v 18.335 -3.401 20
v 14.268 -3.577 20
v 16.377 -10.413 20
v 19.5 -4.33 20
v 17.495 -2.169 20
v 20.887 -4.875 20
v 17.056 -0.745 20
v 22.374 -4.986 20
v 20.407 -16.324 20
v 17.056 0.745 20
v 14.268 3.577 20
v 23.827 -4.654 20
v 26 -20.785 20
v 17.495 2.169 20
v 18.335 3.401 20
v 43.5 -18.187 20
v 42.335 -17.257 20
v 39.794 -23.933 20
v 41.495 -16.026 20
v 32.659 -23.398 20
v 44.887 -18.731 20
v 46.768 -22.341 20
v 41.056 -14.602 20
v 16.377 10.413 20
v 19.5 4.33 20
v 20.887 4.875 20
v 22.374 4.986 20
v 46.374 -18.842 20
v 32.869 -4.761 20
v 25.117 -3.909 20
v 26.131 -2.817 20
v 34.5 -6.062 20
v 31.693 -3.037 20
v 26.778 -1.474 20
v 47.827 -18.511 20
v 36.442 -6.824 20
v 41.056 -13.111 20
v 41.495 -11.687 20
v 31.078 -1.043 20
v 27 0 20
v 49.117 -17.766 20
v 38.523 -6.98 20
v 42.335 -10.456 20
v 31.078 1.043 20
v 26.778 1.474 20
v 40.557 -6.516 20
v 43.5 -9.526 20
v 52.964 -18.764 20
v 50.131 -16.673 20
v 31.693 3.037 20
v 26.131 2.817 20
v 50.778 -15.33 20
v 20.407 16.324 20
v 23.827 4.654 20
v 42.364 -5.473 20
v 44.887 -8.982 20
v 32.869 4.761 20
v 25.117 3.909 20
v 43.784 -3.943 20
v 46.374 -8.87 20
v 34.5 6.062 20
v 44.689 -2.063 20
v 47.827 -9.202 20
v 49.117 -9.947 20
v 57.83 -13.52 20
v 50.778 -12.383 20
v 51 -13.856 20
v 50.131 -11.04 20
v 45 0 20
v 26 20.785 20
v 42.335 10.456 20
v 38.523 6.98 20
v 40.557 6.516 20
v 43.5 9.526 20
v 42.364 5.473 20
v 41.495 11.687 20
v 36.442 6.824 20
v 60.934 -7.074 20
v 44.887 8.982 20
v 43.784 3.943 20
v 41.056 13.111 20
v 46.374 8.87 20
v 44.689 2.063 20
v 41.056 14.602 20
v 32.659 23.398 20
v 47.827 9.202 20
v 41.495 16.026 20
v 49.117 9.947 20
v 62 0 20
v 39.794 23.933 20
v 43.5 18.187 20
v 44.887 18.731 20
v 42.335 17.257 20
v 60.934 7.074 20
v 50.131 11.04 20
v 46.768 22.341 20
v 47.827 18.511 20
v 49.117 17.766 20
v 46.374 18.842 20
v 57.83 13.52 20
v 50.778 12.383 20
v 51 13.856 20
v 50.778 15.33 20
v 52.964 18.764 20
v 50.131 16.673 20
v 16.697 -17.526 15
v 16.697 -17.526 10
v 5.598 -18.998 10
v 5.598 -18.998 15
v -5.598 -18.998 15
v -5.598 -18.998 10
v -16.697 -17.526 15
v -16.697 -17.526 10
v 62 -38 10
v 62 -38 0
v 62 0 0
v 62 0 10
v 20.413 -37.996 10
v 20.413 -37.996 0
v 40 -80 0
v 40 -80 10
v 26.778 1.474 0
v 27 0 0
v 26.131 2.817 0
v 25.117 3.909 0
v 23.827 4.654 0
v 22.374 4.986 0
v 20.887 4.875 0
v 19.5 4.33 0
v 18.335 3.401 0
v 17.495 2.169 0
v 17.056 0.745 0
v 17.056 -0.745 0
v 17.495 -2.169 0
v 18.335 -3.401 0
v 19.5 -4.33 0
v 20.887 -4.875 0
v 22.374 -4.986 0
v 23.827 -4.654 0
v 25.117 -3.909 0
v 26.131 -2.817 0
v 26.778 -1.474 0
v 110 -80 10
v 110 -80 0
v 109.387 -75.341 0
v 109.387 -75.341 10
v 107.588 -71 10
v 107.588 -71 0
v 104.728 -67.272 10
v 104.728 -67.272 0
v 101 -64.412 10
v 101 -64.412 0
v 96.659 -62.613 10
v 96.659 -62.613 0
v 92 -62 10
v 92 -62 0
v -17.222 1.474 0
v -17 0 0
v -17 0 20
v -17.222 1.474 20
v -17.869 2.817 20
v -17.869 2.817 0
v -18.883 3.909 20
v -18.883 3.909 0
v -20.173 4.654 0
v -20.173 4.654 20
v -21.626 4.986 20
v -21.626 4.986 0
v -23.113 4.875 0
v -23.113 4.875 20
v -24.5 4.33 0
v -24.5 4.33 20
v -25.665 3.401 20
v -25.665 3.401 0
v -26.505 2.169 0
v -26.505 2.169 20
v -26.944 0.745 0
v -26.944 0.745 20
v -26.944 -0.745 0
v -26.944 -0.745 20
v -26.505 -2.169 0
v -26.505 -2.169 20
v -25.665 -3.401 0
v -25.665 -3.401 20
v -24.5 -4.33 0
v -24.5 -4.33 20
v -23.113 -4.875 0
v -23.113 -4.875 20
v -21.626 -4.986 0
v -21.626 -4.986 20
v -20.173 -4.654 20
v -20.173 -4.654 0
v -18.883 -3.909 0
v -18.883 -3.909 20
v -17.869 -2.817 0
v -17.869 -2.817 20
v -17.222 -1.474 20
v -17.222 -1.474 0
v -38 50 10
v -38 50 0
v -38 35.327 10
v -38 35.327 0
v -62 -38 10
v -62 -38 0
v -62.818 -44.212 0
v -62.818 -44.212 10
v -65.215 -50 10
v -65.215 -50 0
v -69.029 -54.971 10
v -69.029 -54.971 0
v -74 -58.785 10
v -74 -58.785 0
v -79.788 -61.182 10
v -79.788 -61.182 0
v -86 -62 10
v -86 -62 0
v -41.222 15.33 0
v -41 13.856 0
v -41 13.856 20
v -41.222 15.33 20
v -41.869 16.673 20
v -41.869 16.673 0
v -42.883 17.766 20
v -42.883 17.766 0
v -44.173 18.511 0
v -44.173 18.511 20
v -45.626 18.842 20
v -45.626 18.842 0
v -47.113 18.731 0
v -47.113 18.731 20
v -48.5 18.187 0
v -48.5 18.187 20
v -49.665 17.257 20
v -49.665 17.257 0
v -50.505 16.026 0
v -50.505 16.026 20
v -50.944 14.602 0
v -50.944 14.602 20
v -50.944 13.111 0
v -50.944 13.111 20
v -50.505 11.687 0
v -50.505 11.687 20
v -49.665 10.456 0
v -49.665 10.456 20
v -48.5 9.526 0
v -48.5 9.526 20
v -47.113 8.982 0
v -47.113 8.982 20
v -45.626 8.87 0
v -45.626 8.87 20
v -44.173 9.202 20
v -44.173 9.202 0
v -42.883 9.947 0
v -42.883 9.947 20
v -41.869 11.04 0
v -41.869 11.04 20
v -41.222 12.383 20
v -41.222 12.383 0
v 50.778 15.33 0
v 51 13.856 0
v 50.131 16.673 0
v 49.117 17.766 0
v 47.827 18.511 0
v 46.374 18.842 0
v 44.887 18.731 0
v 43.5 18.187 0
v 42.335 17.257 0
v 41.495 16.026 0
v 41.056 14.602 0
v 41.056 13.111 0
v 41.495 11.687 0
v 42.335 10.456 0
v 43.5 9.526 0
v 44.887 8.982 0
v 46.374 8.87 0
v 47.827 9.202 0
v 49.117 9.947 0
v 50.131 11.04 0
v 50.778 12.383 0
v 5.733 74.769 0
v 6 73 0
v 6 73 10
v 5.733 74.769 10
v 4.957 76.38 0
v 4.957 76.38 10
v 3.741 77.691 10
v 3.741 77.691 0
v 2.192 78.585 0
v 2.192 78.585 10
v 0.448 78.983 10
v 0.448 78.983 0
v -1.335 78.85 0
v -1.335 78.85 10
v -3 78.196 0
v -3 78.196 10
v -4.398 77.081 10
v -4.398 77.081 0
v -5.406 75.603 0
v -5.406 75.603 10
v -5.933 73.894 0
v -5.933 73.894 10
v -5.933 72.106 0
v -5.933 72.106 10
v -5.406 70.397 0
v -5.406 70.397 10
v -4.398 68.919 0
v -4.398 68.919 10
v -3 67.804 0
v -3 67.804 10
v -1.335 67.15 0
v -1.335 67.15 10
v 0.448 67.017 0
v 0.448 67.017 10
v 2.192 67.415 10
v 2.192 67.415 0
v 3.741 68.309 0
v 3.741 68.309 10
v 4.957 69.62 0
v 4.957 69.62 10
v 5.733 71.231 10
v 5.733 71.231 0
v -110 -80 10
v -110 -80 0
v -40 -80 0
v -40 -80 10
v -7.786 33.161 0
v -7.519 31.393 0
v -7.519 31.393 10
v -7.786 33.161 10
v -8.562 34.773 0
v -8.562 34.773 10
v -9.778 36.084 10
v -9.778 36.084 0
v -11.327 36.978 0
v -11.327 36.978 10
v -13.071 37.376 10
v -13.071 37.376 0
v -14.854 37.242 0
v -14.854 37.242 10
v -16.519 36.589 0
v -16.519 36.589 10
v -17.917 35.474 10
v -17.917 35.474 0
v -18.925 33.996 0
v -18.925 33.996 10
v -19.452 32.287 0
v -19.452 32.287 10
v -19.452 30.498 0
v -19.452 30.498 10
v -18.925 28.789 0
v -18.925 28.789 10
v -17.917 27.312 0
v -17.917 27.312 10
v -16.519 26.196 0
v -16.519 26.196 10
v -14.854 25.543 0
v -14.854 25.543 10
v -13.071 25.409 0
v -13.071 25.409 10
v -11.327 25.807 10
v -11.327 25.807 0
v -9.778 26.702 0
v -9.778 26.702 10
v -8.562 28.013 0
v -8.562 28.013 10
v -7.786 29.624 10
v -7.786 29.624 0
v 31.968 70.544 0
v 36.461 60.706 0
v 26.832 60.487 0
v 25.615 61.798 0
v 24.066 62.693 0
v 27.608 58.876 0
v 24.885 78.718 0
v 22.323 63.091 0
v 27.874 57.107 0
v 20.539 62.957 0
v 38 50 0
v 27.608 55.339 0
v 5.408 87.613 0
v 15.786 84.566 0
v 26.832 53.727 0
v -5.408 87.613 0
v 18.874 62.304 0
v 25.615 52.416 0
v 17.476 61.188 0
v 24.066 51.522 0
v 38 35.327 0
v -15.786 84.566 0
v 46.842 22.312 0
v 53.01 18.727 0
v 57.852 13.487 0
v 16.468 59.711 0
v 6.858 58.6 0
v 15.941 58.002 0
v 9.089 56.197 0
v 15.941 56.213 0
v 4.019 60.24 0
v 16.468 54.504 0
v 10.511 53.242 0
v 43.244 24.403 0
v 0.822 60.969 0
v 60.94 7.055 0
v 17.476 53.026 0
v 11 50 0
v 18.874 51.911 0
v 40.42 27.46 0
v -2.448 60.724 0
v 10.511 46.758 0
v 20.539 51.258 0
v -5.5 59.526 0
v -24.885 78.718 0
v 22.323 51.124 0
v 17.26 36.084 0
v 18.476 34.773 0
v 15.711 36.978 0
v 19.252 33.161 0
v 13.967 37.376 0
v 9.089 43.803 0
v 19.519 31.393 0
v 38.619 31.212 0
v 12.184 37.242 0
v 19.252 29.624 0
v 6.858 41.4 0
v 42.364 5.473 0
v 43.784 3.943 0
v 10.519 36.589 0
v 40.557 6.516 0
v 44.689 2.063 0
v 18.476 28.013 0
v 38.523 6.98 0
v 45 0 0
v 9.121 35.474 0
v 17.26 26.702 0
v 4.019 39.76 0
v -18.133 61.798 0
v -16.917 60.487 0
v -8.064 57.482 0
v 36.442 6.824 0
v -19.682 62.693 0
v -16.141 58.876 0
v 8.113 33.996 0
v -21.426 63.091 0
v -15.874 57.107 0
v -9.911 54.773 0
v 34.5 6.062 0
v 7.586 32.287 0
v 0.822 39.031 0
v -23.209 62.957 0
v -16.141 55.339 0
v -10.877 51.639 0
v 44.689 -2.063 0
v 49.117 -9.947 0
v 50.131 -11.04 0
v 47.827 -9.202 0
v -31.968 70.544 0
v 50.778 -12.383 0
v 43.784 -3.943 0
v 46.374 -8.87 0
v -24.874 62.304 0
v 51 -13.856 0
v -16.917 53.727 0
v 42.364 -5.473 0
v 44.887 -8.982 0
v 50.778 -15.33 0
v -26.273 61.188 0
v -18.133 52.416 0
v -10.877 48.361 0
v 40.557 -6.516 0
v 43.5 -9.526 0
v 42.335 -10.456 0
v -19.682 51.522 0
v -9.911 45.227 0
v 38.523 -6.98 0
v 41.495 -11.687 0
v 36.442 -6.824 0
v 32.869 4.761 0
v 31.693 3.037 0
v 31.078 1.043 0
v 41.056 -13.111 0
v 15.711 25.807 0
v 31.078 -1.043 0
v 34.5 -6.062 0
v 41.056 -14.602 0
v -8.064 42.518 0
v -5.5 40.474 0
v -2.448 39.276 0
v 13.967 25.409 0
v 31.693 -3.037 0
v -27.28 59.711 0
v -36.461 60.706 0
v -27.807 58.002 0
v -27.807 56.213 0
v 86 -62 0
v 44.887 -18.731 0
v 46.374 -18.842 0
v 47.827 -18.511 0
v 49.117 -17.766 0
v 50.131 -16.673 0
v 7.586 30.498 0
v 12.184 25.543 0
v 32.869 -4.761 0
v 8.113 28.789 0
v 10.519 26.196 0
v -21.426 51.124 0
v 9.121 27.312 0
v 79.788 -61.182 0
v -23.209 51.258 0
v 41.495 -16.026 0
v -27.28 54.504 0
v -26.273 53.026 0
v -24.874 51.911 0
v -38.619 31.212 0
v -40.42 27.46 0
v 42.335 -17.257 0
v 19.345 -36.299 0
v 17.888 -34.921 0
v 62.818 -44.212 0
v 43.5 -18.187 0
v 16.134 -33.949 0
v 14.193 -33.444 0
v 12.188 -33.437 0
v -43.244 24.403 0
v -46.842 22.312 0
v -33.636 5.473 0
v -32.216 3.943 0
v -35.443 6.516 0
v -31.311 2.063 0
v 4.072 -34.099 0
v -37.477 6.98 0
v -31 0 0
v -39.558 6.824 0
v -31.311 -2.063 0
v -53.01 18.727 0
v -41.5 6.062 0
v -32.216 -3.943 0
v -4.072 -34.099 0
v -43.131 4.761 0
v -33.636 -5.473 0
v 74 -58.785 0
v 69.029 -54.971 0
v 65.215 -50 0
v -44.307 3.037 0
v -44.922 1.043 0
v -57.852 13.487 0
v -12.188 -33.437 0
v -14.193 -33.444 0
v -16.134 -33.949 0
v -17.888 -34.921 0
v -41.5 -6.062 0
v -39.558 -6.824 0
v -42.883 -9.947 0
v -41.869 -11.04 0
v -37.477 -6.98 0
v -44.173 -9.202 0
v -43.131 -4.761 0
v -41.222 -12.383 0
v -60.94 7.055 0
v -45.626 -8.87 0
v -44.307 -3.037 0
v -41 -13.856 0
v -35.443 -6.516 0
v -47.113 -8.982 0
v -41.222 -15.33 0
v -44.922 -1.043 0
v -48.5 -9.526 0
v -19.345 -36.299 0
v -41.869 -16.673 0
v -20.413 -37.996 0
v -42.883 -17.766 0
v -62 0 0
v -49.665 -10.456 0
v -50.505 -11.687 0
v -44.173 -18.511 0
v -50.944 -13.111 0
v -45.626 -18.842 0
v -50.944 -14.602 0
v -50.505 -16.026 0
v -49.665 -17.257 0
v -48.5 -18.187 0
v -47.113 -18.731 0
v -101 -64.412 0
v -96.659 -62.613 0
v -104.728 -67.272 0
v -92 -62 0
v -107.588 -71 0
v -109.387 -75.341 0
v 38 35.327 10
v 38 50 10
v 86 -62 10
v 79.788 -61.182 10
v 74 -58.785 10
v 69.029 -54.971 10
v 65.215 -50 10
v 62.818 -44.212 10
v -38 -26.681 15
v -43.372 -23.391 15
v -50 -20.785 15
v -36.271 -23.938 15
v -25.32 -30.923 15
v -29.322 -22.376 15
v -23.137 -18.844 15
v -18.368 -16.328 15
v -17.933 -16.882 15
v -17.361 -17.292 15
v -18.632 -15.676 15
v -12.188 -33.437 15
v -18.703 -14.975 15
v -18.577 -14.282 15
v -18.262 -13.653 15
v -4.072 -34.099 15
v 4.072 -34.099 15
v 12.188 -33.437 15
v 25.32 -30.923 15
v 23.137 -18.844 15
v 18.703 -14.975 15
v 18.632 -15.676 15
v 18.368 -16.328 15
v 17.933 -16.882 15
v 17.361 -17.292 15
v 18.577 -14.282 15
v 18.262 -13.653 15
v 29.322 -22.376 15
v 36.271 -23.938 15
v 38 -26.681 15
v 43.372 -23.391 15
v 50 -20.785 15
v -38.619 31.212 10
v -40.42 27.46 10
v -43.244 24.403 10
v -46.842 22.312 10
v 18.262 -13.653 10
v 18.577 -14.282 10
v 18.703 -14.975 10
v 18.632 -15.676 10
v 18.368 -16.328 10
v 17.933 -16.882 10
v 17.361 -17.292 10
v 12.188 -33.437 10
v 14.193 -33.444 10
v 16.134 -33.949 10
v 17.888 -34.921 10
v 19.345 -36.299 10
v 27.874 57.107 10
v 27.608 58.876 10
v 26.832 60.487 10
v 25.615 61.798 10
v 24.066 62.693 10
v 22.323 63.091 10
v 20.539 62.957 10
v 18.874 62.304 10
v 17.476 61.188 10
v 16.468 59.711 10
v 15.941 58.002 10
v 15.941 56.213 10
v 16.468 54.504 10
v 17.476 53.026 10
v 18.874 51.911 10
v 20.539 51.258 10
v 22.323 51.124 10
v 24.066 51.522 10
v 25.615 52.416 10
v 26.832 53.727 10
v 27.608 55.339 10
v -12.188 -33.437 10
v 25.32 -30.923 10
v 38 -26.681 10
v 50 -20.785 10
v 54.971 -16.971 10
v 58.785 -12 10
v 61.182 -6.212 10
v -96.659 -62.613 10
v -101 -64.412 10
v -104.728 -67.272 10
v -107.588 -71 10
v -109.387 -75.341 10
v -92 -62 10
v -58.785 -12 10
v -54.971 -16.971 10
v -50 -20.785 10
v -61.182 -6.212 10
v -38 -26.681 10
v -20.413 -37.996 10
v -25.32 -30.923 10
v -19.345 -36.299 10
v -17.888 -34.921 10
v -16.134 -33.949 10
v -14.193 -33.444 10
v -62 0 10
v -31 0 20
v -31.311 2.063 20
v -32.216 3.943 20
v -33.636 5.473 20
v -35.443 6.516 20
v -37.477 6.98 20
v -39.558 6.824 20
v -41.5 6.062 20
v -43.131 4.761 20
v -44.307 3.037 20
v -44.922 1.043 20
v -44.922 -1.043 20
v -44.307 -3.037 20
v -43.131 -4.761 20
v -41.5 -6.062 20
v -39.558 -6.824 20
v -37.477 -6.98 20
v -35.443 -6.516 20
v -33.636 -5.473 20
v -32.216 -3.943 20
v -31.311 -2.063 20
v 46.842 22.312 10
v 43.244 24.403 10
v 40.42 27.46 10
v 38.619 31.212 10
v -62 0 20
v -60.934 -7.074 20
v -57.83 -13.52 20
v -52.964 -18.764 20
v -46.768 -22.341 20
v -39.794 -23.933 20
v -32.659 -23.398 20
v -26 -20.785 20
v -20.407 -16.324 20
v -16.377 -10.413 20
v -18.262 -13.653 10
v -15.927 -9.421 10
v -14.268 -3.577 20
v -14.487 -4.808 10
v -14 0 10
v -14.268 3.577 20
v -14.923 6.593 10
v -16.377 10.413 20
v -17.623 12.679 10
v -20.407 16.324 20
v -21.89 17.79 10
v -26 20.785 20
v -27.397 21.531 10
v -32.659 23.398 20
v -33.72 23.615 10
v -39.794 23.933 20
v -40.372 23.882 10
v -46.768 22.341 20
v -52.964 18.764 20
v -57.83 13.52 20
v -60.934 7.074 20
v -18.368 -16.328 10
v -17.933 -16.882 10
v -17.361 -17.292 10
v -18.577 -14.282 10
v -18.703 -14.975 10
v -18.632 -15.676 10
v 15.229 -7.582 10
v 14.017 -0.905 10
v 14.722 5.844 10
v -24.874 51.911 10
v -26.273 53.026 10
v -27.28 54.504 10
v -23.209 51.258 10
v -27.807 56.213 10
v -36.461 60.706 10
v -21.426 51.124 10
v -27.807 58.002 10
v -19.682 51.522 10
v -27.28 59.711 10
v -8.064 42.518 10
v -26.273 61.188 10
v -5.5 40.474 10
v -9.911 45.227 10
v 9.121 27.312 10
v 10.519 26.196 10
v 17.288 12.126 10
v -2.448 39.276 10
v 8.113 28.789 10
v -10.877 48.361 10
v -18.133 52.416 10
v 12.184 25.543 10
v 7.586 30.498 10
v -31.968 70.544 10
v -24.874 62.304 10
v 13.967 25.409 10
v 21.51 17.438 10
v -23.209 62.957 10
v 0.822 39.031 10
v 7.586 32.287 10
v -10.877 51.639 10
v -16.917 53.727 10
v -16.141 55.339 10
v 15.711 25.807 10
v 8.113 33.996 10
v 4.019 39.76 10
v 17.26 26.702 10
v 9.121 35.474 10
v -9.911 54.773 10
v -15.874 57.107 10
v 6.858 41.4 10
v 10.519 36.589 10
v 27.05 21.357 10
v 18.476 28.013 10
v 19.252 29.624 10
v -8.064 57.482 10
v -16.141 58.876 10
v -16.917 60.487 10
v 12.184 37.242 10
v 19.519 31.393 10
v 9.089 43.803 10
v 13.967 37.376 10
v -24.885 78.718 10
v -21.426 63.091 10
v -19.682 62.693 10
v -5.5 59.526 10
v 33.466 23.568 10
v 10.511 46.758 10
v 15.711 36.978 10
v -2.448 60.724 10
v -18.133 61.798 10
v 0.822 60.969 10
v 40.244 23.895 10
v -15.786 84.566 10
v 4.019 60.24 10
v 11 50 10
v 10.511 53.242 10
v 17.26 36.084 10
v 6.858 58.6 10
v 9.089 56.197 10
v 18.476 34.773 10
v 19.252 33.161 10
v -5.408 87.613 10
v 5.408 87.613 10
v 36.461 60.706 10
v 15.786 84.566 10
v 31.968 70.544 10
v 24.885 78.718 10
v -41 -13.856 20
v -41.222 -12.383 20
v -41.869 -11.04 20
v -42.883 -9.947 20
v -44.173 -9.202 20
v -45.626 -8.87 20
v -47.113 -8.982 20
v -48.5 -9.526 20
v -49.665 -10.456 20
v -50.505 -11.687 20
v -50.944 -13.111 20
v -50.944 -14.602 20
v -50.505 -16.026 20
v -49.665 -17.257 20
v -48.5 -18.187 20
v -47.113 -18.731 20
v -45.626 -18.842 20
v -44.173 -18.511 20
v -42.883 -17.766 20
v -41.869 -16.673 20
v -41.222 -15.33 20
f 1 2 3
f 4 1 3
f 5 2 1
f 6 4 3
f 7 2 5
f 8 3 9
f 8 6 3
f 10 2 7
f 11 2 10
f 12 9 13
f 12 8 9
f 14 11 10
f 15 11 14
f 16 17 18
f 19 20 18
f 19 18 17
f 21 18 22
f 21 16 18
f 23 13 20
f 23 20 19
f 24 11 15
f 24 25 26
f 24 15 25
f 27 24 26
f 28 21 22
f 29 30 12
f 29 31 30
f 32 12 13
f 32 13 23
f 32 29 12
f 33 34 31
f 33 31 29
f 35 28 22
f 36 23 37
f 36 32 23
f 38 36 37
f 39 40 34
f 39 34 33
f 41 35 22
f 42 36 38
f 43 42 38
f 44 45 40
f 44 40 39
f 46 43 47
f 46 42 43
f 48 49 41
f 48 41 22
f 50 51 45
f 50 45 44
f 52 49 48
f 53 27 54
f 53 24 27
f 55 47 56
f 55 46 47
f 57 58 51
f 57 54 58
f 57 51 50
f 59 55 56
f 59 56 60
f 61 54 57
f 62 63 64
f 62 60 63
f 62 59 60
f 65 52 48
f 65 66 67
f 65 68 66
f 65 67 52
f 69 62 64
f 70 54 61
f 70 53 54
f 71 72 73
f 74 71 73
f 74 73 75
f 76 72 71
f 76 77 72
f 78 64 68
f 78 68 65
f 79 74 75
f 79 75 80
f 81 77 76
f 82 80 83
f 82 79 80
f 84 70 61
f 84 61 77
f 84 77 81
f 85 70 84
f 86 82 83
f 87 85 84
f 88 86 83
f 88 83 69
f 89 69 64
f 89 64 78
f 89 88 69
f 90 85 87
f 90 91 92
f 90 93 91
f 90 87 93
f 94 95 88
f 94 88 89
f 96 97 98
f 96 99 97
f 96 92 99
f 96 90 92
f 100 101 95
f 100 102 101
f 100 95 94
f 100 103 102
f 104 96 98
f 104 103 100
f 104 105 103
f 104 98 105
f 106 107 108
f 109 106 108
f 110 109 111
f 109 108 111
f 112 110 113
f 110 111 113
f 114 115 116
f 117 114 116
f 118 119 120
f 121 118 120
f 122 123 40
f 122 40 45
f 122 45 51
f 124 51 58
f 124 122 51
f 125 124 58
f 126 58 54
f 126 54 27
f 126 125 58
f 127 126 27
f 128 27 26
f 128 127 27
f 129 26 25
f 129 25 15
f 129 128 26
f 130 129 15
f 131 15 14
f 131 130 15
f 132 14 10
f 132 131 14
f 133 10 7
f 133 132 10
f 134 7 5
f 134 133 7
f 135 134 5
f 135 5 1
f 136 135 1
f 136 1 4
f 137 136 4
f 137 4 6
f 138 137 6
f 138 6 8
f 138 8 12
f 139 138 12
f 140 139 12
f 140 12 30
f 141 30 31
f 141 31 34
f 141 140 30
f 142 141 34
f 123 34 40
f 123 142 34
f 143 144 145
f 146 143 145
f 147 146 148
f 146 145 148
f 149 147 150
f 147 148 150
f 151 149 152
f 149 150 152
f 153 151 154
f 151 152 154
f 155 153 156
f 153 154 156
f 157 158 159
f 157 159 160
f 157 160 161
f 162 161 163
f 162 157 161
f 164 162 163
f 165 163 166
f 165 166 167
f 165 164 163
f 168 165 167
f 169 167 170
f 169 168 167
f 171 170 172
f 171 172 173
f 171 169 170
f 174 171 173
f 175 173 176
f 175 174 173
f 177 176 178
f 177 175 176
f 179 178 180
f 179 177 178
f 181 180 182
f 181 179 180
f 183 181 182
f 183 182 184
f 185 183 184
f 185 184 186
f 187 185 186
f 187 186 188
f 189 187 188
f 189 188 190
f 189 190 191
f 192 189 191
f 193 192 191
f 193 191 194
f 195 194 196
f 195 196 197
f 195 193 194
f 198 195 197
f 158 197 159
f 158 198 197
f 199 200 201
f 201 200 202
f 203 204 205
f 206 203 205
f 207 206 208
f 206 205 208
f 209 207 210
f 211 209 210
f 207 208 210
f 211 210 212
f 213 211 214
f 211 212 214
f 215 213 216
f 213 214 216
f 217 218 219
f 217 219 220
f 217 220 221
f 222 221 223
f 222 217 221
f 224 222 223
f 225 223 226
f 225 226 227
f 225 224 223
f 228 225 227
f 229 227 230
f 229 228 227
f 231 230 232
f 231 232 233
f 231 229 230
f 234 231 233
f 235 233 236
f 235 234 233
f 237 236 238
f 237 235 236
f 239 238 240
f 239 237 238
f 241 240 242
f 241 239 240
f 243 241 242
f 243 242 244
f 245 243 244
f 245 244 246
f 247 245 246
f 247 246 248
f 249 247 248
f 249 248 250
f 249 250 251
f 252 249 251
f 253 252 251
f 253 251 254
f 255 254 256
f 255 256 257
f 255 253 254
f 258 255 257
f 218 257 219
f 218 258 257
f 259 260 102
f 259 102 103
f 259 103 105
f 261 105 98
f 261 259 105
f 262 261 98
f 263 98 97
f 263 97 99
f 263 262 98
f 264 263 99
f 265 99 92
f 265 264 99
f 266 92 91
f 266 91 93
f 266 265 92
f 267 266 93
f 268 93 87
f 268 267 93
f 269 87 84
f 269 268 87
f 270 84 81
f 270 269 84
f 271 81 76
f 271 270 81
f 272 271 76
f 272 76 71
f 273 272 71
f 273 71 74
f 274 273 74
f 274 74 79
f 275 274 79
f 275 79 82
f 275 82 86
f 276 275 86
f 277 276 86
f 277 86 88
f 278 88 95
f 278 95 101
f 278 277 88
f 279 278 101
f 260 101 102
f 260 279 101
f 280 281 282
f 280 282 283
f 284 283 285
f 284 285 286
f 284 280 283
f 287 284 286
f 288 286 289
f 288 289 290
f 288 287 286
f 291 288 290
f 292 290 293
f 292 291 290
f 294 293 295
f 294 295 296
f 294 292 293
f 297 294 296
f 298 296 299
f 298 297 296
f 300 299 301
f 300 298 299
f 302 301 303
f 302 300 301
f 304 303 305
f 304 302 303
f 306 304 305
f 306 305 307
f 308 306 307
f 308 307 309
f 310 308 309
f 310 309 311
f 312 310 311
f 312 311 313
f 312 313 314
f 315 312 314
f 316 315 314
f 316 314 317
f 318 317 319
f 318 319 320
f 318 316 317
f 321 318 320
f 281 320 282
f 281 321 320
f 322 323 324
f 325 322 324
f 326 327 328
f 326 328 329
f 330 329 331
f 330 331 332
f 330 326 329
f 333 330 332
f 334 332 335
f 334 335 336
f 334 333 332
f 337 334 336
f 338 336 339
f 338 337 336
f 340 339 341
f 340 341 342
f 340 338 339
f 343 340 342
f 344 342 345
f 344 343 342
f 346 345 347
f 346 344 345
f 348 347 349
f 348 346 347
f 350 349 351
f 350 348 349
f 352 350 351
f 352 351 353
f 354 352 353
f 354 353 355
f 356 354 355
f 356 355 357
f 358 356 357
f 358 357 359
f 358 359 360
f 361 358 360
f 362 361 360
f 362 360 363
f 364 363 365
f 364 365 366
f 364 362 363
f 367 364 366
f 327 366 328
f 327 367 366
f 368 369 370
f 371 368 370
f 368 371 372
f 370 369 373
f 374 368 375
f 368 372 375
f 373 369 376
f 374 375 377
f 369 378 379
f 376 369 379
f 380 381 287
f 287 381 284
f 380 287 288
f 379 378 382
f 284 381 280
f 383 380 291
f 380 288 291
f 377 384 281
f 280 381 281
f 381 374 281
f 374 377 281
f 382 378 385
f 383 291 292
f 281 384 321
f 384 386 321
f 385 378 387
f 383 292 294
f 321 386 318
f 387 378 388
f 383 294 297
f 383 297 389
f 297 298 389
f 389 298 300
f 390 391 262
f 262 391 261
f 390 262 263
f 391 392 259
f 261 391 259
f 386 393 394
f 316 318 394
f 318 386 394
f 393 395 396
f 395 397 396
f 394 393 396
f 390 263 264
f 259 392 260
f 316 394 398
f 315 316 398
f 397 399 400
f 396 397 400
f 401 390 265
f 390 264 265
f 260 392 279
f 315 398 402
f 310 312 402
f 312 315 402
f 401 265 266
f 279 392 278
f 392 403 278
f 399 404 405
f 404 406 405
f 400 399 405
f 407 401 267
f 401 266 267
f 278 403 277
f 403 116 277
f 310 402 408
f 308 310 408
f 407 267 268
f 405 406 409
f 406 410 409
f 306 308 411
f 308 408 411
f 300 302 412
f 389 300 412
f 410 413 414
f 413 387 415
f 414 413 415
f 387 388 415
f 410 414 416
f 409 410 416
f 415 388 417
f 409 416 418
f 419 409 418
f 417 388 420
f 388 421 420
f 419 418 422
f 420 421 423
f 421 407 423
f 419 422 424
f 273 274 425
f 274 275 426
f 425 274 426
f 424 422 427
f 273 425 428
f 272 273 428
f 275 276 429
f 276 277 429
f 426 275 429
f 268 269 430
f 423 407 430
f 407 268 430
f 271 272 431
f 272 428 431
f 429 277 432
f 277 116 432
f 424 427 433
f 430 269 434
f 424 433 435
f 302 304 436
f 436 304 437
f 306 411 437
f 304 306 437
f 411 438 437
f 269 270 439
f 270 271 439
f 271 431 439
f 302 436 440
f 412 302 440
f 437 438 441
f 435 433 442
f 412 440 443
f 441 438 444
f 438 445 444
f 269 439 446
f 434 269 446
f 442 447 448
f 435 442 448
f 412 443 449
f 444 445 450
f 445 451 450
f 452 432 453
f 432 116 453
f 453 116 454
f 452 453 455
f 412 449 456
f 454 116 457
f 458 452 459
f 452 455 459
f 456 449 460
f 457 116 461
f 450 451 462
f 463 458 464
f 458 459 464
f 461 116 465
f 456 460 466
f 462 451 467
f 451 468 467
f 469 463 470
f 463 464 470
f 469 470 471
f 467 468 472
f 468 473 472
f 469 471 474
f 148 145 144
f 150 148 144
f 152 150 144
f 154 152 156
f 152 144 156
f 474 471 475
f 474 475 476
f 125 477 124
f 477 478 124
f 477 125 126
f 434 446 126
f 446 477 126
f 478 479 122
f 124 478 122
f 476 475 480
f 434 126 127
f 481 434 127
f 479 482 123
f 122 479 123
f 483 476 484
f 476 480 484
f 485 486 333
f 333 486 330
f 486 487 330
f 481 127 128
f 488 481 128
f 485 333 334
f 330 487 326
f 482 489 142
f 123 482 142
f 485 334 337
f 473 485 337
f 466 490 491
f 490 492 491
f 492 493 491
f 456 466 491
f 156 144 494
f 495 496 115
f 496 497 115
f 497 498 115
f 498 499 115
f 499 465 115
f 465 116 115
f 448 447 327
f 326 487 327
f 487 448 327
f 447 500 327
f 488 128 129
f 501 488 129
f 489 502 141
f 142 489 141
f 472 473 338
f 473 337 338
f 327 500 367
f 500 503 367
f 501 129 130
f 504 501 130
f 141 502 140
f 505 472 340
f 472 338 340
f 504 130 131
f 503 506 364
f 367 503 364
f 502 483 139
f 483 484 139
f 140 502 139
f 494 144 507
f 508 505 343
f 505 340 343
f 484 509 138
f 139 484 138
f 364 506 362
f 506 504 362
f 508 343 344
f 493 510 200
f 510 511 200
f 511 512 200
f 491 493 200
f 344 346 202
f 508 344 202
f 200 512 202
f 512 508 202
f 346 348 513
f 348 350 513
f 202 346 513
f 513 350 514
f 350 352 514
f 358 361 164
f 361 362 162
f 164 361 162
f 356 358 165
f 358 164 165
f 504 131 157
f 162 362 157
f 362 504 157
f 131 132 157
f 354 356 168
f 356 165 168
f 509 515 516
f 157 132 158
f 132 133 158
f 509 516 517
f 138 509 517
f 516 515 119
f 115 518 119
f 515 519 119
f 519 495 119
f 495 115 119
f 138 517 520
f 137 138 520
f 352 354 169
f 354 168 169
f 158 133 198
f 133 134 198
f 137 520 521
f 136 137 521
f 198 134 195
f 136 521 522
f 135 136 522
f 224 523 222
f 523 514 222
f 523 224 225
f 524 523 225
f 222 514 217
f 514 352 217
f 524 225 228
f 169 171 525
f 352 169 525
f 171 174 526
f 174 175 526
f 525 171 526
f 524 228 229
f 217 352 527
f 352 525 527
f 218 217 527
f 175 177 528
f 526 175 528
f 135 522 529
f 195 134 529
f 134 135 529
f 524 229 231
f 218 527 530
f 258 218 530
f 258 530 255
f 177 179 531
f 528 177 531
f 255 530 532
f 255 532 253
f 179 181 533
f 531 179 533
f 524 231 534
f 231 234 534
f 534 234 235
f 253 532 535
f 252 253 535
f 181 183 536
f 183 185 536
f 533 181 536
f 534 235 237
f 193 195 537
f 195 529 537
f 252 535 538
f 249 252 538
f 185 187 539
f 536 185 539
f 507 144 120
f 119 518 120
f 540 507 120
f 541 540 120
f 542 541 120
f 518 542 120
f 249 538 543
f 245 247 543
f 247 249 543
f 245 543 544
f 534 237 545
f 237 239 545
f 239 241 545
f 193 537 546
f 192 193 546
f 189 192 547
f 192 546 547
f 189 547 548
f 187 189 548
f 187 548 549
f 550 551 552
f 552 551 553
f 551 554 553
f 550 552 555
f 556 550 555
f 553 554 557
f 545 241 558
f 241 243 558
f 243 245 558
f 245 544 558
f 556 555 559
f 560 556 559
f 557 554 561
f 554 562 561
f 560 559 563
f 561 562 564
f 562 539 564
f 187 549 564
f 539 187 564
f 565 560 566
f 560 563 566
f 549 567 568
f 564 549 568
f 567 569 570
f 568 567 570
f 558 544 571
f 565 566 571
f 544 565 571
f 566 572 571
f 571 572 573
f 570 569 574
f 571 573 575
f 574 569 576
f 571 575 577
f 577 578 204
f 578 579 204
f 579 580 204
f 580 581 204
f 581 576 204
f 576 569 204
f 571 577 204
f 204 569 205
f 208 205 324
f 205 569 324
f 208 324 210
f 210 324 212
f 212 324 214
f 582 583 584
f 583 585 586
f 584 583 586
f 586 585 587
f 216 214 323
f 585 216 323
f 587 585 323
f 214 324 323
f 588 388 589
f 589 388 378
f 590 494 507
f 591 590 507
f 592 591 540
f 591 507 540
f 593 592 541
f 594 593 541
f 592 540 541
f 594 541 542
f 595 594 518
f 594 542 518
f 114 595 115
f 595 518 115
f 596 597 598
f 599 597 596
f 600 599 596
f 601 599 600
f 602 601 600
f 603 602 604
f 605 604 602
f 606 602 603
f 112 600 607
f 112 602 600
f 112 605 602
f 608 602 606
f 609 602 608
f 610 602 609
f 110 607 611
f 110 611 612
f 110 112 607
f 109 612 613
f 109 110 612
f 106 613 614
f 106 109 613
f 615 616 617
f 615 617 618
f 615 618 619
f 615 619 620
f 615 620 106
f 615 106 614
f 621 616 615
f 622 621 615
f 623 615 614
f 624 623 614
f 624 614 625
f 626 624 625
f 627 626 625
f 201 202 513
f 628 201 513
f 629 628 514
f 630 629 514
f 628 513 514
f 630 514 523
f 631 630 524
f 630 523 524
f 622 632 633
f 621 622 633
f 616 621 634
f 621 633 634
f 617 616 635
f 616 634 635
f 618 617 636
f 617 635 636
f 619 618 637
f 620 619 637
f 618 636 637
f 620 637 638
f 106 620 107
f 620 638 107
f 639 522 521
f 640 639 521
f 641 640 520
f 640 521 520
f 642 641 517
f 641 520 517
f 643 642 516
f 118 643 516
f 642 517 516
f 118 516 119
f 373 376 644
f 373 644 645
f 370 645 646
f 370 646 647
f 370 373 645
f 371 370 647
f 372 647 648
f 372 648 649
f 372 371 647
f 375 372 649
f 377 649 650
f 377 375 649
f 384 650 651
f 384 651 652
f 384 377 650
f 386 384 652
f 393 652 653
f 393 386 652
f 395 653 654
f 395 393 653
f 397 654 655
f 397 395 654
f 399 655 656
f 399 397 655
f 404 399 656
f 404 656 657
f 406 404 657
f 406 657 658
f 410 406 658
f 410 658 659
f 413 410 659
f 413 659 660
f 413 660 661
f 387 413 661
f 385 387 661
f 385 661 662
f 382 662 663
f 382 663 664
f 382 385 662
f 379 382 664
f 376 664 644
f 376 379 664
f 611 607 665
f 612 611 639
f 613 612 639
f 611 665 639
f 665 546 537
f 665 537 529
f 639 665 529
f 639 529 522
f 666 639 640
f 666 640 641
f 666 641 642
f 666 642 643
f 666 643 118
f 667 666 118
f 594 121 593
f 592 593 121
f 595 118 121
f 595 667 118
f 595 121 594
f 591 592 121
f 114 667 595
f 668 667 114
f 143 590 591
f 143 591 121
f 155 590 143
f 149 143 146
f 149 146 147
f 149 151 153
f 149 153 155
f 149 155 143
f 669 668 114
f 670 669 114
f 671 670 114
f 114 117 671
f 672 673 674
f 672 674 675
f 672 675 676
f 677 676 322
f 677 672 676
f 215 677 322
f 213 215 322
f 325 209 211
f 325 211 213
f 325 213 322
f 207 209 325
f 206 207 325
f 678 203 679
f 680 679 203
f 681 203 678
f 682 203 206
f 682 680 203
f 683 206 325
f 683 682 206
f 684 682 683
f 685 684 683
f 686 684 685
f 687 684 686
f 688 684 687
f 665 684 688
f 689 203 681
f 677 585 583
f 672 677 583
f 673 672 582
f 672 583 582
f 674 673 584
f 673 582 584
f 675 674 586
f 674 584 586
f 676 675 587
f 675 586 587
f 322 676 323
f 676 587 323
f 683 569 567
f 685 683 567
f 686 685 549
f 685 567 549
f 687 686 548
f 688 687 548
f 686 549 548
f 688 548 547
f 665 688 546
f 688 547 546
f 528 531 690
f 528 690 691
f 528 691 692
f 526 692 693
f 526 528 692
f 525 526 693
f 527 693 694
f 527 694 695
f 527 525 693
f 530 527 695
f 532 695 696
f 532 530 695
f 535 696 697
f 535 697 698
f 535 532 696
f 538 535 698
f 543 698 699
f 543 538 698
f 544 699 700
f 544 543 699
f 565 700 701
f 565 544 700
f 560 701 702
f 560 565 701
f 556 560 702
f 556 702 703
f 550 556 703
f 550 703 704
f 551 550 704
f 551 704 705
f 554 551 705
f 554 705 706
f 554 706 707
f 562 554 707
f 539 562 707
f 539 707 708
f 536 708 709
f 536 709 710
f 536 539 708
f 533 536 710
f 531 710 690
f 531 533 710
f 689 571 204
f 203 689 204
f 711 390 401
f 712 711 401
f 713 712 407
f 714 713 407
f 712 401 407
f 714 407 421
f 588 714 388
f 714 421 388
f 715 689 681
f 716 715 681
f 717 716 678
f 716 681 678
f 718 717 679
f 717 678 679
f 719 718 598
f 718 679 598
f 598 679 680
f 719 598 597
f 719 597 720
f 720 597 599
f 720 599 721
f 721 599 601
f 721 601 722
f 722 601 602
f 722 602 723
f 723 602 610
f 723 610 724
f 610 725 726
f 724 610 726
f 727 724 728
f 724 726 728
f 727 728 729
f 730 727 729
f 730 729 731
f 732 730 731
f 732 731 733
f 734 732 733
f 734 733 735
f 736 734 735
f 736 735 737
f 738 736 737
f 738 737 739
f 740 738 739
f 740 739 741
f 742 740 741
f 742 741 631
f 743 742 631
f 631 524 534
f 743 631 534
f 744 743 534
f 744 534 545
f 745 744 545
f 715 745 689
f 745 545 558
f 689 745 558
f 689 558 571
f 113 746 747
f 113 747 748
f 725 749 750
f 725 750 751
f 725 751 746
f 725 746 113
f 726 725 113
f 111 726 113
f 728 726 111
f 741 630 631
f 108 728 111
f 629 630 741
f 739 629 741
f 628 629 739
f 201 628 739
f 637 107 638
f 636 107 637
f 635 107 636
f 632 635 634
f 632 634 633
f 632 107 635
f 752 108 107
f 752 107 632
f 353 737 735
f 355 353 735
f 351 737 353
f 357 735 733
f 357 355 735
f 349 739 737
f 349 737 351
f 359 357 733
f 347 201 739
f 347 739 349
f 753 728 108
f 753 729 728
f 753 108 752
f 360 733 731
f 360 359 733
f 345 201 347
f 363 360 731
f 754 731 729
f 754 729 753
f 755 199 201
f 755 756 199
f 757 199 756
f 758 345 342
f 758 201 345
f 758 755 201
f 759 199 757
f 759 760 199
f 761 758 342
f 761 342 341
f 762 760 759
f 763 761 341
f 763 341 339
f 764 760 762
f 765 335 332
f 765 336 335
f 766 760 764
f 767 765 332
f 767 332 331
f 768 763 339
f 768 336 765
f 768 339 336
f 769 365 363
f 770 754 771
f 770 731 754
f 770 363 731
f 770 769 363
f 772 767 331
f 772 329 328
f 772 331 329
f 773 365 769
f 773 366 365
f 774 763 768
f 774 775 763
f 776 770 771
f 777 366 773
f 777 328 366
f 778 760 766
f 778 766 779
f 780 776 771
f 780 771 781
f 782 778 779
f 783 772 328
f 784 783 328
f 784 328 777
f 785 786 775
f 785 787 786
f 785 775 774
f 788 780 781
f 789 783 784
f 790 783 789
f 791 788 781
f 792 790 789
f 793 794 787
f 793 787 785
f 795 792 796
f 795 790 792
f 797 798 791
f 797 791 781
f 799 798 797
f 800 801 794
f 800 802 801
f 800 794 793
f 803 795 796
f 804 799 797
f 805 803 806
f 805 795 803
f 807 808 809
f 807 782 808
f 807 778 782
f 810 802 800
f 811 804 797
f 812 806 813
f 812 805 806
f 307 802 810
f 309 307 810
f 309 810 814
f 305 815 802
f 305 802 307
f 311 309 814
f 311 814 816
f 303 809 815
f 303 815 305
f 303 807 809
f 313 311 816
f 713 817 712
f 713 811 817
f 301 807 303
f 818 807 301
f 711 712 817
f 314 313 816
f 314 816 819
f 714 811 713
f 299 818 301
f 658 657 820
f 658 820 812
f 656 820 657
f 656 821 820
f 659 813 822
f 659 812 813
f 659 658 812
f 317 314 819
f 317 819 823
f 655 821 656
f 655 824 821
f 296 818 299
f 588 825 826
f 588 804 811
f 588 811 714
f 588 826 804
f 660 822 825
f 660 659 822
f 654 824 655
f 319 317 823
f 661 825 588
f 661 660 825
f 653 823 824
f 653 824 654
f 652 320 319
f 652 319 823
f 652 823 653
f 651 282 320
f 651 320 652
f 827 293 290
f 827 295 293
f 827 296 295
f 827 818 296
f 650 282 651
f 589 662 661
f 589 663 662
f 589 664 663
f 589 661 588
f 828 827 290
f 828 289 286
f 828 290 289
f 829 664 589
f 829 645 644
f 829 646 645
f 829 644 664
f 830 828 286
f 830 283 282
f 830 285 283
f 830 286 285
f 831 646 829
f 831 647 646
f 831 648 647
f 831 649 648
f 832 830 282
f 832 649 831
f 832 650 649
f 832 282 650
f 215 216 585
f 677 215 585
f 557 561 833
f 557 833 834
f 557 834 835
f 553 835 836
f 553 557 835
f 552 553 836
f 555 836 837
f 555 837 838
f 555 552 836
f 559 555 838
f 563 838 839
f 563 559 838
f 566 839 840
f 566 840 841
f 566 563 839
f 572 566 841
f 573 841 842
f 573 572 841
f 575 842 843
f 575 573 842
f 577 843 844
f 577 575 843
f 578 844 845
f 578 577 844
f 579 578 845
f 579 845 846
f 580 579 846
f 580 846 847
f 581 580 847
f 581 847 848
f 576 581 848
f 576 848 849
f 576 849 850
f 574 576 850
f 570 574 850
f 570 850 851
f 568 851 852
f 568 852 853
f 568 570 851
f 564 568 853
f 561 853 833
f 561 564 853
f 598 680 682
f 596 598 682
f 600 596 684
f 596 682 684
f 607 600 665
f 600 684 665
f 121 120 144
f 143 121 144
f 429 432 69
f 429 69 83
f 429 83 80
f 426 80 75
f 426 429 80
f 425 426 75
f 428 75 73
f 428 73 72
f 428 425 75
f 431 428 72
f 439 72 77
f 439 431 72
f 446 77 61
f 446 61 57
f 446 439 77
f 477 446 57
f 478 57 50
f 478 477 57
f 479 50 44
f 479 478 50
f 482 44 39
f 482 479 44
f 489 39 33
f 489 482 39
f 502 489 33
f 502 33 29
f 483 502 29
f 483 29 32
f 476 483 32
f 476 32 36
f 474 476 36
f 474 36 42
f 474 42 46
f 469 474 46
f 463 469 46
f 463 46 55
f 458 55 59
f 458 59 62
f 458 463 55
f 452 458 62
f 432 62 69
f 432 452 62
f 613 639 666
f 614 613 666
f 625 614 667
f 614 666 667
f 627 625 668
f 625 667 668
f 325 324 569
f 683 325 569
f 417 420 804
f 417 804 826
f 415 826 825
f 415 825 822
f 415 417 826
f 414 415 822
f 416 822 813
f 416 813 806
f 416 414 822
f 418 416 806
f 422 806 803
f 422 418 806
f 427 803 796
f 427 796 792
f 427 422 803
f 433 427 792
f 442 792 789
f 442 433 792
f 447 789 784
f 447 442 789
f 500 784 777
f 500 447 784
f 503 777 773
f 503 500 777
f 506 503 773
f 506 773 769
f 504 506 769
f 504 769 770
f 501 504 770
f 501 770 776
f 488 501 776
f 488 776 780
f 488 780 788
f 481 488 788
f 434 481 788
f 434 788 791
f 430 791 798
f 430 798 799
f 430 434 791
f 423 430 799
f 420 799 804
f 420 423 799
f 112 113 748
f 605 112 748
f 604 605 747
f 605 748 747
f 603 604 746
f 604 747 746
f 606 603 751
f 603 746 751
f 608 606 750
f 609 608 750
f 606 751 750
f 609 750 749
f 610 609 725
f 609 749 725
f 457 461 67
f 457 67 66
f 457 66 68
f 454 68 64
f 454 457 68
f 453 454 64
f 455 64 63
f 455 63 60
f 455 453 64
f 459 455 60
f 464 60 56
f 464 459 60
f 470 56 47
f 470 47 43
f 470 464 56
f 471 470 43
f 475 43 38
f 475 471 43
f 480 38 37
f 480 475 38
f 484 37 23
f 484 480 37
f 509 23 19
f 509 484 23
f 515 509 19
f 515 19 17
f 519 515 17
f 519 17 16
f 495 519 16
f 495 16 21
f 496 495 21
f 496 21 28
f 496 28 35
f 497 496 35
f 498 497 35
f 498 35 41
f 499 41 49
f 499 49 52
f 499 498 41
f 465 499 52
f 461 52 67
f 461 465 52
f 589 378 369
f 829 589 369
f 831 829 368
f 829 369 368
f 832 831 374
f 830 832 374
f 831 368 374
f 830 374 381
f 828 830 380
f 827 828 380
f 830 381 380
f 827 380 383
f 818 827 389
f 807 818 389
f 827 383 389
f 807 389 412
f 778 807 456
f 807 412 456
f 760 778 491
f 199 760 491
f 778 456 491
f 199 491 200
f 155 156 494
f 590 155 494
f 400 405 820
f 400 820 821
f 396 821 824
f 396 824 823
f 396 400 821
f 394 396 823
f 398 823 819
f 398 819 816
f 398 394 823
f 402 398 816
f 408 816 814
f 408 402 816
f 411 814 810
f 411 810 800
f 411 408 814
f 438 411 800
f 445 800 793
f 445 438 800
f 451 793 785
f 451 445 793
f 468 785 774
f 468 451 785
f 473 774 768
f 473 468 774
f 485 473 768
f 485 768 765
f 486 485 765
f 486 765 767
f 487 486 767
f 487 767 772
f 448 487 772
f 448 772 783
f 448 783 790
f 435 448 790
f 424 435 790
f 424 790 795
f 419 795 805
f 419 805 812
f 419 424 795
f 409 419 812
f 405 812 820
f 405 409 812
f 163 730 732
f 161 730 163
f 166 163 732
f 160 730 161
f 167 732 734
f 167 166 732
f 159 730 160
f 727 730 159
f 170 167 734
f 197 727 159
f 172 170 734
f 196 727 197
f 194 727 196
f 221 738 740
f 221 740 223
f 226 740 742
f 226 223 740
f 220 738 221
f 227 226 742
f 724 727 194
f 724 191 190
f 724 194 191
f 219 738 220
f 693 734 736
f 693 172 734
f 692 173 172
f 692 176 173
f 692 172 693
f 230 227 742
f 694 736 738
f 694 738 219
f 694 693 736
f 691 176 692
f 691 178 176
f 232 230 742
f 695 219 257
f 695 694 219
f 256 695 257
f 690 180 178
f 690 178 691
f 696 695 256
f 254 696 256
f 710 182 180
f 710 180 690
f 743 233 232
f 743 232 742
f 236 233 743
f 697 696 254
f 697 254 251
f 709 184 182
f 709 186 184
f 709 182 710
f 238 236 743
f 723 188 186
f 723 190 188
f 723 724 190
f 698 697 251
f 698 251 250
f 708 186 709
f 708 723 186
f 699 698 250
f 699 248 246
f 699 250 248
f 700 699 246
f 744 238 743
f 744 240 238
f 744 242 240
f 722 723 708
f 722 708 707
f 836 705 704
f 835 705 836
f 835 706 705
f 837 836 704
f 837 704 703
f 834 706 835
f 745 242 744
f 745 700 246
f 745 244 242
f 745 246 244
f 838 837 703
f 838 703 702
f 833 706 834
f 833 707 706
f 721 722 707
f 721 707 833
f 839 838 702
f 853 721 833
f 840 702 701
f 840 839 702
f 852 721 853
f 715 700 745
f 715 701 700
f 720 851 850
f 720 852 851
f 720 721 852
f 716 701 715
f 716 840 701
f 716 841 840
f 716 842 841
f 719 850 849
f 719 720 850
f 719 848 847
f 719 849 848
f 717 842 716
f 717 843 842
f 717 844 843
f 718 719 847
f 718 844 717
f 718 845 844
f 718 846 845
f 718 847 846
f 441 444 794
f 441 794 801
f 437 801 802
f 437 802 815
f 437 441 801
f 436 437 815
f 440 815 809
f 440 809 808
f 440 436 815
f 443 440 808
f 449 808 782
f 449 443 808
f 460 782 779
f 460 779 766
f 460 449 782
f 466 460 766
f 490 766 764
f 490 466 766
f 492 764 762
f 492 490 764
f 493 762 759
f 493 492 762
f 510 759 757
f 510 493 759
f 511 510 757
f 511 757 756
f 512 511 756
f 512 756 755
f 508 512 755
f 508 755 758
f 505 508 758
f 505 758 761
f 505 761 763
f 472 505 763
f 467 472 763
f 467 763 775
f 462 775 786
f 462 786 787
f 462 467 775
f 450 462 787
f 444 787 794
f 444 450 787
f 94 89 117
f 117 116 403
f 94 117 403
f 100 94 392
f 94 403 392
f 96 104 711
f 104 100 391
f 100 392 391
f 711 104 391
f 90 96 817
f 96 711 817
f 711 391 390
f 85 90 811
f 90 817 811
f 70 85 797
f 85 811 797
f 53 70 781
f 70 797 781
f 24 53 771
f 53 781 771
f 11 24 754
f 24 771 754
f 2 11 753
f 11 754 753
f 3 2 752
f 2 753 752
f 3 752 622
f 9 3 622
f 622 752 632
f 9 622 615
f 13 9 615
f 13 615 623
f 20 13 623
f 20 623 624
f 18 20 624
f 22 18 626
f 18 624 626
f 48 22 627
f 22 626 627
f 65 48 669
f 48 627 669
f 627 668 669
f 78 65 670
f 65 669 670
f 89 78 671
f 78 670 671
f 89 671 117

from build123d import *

# Parameters (mm, degrees)
SKETCH_1_R        = 6
SKETCH_1_R_2      = 11
EXTRUDE_1_DEPTH   = 10
EXTRUDE_1_2_DEPTH = 10
EXTRUDE_1_3_DEPTH = 10
EXTRUDE_2_DEPTH   = 15
SKETCH_1_4_R      = 24
SKETCH_1_4_R_2    = 5
SKETCH_1_4_R_3    = 7
EXTRUDE_3_DEPTH   = 20


with BuildPart() as part:
    # Эскиз1 → Бобышка-Вытянуть1 (new body)
    with BuildSketch(Plane.XY):
        with BuildLine():
            ThreePointArc((38, 50), (0, 88), (-38, 50))
            Line((-38, 50), (-38, 35.327043465))
            ThreePointArc((-38, 35.327043465), (-40.419617314, 27.459722648), (-46.842105263, 22.311816925))
            ThreePointArc((-46.842105263, 22.311816925), (-19.210562093, 14.931745483), (-18.261574548, -13.652639329))
            ThreePointArc((-18.261574548, -13.652639329), (-18.523440421, -16.011324994), (-16.696563974, -17.526083803))
            ThreePointArc((-16.696563974, -17.526083803), (0, -19.182069312), (16.696563974, -17.526083803))
            ThreePointArc((16.696563974, -17.526083803), (18.523440421, -16.011324994), (18.261574548, -13.652639329))
            ThreePointArc((18.261574548, -13.652639329), (19.210562093, 14.931745483), (46.842105263, 22.311816925))
            ThreePointArc((46.842105263, 22.311816925), (40.419617314, 27.459722648), (38, 35.327043465))
            Line((38, 35.327043465), (38, 50))
        make_face()
        with Locations((-13.519060803, 31.392609129)):
            Circle(SKETCH_1_R, mode=Mode.SUBTRACT)
        with Locations((0, 50)):
            Circle(SKETCH_1_R_2, mode=Mode.SUBTRACT)
        with Locations((-21.874299875, 57.107390871)):
            Circle(SKETCH_1_R, mode=Mode.SUBTRACT)
        with Locations((0, 73)):
            Circle(SKETCH_1_R, mode=Mode.SUBTRACT)
        with Locations((13.519060803, 31.392609129)):
            Circle(SKETCH_1_R, mode=Mode.SUBTRACT)
        with Locations((21.874299875, 57.107390871)):
            Circle(SKETCH_1_R, mode=Mode.SUBTRACT)
    extrude(amount=EXTRUDE_1_DEPTH)



with BuildPart() as body_2:
    # Эскиз1 → Extrude 1 2 (new body)
    with BuildSketch(Plane.XY):
        with BuildLine():
            ThreePointArc((-50, -20.784609691), (-58.784609691, -12), (-62, 0))
            Line((-62, 0), (-62, -38))
            ThreePointArc((-62, -38), (-69.029437252, -54.970562748), (-86, -62))
            Line((-86, -62), (-92, -62))
            ThreePointArc((-92, -62), (-104.727922061, -67.272077939), (-110, -80))
            Line((-110, -80), (-40, -80))
            Line((-40, -80), (-20.413213913, -37.996001687))
            ThreePointArc((-20.413213913, -37.996001687), (-17.041200429, -34.37997452), (-12.187732979, -33.436586413))
            ThreePointArc((-12.187732979, -33.436586413), (-31.730847168, -29.014307175), (-50, -20.784609691))
        make_face()
    extrude(amount=EXTRUDE_1_2_DEPTH)


with BuildPart() as body_3:
    # Эскиз1 → Extrude 1 3 (new body)
    with BuildSketch(Plane.XY):
        with BuildLine():
            Line((62, -38), (62, 0))
            ThreePointArc((62, 0), (58.784609691, -12), (50, -20.784609691))
            ThreePointArc((50, -20.784609691), (31.730847168, -29.014307175), (12.187732979, -33.436586413))
            ThreePointArc((12.187732979, -33.436586413), (17.041200429, -34.37997452), (20.413213913, -37.996001687))
            Line((20.413213913, -37.996001687), (40, -80))
            Line((40, -80), (110, -80))
            ThreePointArc((110, -80), (104.727922061, -67.272077939), (92, -62))
            Line((92, -62), (86, -62))
            ThreePointArc((86, -62), (69.029437252, -54.970562748), (62, -38))
        make_face()
    extrude(amount=EXTRUDE_1_3_DEPTH)


with BuildPart() as part_1:
    add(part.part)

    add(body_2.part)  # Бобышка-Вытянуть2 merges body 2

    add(body_3.part)  # Бобышка-Вытянуть2 merges body 3
    # Эскиз1<3> → Бобышка-Вытянуть2 (add)
    with BuildSketch(Plane.XY):
        with BuildLine():
            ThreePointArc((-16.696563974, -17.526083803), (-18.523440421, -16.011324994), (-18.261574548, -13.652639329))
            ThreePointArc((-18.261574548, -13.652639329), (-32.738150759, -23.416082989), (-50, -20.784609691))
            ThreePointArc((-50, -20.784609691), (-31.730847168, -29.014307175), (-12.187732979, -33.436586413))
            ThreePointArc((-12.187732979, -33.436586413), (0, -34.182069312), (12.187732979, -33.436586413))
            ThreePointArc((12.187732979, -33.436586413), (31.730847168, -29.014307175), (50, -20.784609691))
            ThreePointArc((50, -20.784609691), (32.738150759, -23.416082989), (18.261574548, -13.652639329))
            ThreePointArc((18.261574548, -13.652639329), (18.523440421, -16.011324994), (16.696563974, -17.526083803))
            ThreePointArc((16.696563974, -17.526083803), (0, -19.182069312), (-16.696563974, -17.526083803))
        make_face()
    extrude(amount=EXTRUDE_2_DEPTH)

    # Эскиз1<4> → Бобышка-Вытянуть3 (add)
    # profile 1 of 2: a face of its own
    with BuildSketch(Plane.XY):
        with Locations((-38, 0)):
            Circle(SKETCH_1_4_R)
        with Locations((-46, -13.856406461)):
            Circle(SKETCH_1_4_R_2, mode=Mode.SUBTRACT)
        with Locations((-38, 0)):
            Circle(SKETCH_1_4_R_3, mode=Mode.SUBTRACT)
        with Locations((-22, 0)):
            Circle(SKETCH_1_4_R_2, mode=Mode.SUBTRACT)
        with Locations((-46, 13.856406461)):
            Circle(SKETCH_1_4_R_2, mode=Mode.SUBTRACT)
    # profile 2 of 2: a face of its own
    with BuildSketch(Plane.XY):
        with Locations((38, 0)):
            Circle(SKETCH_1_4_R)
        with Locations((22, 0)):
            Circle(SKETCH_1_4_R_2, mode=Mode.SUBTRACT)
        with Locations((46, -13.856406461)):
            Circle(SKETCH_1_4_R_2, mode=Mode.SUBTRACT)
        with Locations((38, 0)):
            Circle(SKETCH_1_4_R_3, mode=Mode.SUBTRACT)
        with Locations((46, 13.856406461)):
            Circle(SKETCH_1_4_R_2, mode=Mode.SUBTRACT)
    extrude(amount=EXTRUDE_3_DEPTH)


solid = part_1.part
